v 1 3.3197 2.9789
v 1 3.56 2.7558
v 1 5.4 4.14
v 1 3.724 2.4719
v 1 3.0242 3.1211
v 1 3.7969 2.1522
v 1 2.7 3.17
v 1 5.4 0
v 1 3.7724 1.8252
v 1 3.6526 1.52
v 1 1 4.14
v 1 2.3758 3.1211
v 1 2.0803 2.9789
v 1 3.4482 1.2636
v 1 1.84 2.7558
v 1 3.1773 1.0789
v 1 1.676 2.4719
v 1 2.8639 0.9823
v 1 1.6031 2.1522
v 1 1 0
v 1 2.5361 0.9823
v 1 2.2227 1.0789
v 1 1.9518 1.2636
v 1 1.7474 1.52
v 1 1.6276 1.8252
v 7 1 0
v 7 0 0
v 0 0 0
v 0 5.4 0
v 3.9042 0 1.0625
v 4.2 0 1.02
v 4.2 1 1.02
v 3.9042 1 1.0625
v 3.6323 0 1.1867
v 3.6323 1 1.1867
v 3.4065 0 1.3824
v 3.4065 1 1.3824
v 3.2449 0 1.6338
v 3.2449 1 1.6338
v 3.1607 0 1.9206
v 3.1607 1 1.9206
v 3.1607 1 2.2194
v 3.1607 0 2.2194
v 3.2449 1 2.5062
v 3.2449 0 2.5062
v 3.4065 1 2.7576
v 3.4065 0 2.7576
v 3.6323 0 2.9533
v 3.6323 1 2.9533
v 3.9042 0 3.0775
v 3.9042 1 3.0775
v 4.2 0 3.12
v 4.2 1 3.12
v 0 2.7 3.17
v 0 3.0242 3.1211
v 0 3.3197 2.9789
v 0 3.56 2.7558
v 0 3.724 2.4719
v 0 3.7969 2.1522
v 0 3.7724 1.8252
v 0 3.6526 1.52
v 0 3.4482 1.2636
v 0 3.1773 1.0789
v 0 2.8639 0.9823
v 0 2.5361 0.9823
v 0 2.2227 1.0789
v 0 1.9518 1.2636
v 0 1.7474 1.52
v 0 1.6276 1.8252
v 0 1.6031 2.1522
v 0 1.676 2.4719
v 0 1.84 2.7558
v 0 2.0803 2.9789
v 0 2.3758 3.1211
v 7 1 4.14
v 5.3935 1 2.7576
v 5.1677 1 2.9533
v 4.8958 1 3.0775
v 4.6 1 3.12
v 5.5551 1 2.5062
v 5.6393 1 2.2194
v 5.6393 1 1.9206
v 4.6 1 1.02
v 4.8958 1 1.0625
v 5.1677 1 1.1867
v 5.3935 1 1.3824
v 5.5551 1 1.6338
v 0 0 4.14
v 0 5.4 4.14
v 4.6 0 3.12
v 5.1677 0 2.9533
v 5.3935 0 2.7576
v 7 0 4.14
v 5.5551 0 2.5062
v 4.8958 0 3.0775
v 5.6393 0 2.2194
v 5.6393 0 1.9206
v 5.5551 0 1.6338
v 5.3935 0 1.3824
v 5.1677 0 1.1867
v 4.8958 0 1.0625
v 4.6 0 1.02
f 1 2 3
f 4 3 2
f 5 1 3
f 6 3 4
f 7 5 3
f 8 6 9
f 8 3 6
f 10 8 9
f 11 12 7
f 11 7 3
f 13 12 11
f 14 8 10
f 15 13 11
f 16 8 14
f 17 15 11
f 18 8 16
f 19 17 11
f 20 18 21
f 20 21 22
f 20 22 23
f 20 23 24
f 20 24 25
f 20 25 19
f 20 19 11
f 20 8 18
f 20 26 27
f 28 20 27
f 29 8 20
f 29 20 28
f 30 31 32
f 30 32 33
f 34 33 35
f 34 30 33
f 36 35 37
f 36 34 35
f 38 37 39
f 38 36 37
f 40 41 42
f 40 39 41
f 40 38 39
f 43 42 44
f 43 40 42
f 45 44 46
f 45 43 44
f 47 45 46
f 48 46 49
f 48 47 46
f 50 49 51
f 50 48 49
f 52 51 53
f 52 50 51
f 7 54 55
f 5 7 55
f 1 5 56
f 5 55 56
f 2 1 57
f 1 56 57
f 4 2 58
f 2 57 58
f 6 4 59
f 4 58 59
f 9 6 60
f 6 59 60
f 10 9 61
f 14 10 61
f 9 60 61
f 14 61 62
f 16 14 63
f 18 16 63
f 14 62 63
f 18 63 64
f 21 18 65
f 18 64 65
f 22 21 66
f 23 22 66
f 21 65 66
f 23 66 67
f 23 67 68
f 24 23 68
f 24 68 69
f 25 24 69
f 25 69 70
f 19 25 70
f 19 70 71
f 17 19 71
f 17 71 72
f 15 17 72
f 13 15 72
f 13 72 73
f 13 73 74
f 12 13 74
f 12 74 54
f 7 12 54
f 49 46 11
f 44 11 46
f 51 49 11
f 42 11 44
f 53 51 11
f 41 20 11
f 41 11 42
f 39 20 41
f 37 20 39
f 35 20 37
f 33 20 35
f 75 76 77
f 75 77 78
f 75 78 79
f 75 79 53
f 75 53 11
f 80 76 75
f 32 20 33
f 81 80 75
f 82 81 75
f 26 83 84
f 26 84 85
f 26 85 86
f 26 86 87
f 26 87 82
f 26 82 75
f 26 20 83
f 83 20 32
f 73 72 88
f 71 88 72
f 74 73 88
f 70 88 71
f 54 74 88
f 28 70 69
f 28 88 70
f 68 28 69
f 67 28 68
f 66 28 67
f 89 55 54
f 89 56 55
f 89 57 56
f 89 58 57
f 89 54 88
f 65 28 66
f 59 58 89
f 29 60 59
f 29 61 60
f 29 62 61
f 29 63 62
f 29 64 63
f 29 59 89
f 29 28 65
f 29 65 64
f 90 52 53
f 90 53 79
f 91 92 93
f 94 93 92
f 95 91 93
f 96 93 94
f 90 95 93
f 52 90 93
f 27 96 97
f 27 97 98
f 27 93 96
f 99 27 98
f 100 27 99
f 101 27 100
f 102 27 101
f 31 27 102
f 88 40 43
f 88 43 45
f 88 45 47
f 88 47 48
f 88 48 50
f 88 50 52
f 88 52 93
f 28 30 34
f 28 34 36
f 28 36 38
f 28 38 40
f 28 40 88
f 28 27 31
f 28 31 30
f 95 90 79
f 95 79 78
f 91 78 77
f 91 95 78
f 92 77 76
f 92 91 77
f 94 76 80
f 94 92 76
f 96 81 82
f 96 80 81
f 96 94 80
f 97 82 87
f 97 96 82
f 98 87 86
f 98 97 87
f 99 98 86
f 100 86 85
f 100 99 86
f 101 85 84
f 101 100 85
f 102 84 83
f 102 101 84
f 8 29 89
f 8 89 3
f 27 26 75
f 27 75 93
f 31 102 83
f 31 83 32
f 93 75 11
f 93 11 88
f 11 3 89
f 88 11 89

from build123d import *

# Parameters (mm, degrees)
EXTRUDE_1_DEPTH     = 4.14
SKETCH_3_R          = 1.1
CUT_EXTRUDE_1_DEPTH = 10.762151402
CUT_EXTRUDE_2_DEPTH = 10.762151402


with BuildPart() as part:
    # 草图1 → 凸台-拉伸1 (new body)
    with BuildSketch(Plane.XY):
        Polygon((0, 0), (0, 5.4), (1, 5.4), (1, 1), (7, 1), (7, 0), align=None)
    extrude(amount=EXTRUDE_1_DEPTH)

    # 草图3 → 切除-拉伸1 (cut, through all)
    with BuildSketch(Plane.ZY):
        with Locations((2.07, 2.7)):
            Circle(SKETCH_3_R)
    extrude(amount=-CUT_EXTRUDE_1_DEPTH, mode=Mode.SUBTRACT)

    # 草图4 → 切除-拉伸2 (cut, through all)
    with BuildSketch(Plane.XZ):
        with BuildLine():
            Line((4.6, 1.02), (4.2, 1.02))
            ThreePointArc((4.2, 1.02), (3.15, 2.07), (4.2, 3.12))
            Line((4.2, 3.12), (4.6, 3.12))
            ThreePointArc((4.6, 3.12), (5.65, 2.07), (4.6, 1.02))
        make_face()
    extrude(amount=-CUT_EXTRUDE_2_DEPTH, mode=Mode.SUBTRACT)


solid = part.part
